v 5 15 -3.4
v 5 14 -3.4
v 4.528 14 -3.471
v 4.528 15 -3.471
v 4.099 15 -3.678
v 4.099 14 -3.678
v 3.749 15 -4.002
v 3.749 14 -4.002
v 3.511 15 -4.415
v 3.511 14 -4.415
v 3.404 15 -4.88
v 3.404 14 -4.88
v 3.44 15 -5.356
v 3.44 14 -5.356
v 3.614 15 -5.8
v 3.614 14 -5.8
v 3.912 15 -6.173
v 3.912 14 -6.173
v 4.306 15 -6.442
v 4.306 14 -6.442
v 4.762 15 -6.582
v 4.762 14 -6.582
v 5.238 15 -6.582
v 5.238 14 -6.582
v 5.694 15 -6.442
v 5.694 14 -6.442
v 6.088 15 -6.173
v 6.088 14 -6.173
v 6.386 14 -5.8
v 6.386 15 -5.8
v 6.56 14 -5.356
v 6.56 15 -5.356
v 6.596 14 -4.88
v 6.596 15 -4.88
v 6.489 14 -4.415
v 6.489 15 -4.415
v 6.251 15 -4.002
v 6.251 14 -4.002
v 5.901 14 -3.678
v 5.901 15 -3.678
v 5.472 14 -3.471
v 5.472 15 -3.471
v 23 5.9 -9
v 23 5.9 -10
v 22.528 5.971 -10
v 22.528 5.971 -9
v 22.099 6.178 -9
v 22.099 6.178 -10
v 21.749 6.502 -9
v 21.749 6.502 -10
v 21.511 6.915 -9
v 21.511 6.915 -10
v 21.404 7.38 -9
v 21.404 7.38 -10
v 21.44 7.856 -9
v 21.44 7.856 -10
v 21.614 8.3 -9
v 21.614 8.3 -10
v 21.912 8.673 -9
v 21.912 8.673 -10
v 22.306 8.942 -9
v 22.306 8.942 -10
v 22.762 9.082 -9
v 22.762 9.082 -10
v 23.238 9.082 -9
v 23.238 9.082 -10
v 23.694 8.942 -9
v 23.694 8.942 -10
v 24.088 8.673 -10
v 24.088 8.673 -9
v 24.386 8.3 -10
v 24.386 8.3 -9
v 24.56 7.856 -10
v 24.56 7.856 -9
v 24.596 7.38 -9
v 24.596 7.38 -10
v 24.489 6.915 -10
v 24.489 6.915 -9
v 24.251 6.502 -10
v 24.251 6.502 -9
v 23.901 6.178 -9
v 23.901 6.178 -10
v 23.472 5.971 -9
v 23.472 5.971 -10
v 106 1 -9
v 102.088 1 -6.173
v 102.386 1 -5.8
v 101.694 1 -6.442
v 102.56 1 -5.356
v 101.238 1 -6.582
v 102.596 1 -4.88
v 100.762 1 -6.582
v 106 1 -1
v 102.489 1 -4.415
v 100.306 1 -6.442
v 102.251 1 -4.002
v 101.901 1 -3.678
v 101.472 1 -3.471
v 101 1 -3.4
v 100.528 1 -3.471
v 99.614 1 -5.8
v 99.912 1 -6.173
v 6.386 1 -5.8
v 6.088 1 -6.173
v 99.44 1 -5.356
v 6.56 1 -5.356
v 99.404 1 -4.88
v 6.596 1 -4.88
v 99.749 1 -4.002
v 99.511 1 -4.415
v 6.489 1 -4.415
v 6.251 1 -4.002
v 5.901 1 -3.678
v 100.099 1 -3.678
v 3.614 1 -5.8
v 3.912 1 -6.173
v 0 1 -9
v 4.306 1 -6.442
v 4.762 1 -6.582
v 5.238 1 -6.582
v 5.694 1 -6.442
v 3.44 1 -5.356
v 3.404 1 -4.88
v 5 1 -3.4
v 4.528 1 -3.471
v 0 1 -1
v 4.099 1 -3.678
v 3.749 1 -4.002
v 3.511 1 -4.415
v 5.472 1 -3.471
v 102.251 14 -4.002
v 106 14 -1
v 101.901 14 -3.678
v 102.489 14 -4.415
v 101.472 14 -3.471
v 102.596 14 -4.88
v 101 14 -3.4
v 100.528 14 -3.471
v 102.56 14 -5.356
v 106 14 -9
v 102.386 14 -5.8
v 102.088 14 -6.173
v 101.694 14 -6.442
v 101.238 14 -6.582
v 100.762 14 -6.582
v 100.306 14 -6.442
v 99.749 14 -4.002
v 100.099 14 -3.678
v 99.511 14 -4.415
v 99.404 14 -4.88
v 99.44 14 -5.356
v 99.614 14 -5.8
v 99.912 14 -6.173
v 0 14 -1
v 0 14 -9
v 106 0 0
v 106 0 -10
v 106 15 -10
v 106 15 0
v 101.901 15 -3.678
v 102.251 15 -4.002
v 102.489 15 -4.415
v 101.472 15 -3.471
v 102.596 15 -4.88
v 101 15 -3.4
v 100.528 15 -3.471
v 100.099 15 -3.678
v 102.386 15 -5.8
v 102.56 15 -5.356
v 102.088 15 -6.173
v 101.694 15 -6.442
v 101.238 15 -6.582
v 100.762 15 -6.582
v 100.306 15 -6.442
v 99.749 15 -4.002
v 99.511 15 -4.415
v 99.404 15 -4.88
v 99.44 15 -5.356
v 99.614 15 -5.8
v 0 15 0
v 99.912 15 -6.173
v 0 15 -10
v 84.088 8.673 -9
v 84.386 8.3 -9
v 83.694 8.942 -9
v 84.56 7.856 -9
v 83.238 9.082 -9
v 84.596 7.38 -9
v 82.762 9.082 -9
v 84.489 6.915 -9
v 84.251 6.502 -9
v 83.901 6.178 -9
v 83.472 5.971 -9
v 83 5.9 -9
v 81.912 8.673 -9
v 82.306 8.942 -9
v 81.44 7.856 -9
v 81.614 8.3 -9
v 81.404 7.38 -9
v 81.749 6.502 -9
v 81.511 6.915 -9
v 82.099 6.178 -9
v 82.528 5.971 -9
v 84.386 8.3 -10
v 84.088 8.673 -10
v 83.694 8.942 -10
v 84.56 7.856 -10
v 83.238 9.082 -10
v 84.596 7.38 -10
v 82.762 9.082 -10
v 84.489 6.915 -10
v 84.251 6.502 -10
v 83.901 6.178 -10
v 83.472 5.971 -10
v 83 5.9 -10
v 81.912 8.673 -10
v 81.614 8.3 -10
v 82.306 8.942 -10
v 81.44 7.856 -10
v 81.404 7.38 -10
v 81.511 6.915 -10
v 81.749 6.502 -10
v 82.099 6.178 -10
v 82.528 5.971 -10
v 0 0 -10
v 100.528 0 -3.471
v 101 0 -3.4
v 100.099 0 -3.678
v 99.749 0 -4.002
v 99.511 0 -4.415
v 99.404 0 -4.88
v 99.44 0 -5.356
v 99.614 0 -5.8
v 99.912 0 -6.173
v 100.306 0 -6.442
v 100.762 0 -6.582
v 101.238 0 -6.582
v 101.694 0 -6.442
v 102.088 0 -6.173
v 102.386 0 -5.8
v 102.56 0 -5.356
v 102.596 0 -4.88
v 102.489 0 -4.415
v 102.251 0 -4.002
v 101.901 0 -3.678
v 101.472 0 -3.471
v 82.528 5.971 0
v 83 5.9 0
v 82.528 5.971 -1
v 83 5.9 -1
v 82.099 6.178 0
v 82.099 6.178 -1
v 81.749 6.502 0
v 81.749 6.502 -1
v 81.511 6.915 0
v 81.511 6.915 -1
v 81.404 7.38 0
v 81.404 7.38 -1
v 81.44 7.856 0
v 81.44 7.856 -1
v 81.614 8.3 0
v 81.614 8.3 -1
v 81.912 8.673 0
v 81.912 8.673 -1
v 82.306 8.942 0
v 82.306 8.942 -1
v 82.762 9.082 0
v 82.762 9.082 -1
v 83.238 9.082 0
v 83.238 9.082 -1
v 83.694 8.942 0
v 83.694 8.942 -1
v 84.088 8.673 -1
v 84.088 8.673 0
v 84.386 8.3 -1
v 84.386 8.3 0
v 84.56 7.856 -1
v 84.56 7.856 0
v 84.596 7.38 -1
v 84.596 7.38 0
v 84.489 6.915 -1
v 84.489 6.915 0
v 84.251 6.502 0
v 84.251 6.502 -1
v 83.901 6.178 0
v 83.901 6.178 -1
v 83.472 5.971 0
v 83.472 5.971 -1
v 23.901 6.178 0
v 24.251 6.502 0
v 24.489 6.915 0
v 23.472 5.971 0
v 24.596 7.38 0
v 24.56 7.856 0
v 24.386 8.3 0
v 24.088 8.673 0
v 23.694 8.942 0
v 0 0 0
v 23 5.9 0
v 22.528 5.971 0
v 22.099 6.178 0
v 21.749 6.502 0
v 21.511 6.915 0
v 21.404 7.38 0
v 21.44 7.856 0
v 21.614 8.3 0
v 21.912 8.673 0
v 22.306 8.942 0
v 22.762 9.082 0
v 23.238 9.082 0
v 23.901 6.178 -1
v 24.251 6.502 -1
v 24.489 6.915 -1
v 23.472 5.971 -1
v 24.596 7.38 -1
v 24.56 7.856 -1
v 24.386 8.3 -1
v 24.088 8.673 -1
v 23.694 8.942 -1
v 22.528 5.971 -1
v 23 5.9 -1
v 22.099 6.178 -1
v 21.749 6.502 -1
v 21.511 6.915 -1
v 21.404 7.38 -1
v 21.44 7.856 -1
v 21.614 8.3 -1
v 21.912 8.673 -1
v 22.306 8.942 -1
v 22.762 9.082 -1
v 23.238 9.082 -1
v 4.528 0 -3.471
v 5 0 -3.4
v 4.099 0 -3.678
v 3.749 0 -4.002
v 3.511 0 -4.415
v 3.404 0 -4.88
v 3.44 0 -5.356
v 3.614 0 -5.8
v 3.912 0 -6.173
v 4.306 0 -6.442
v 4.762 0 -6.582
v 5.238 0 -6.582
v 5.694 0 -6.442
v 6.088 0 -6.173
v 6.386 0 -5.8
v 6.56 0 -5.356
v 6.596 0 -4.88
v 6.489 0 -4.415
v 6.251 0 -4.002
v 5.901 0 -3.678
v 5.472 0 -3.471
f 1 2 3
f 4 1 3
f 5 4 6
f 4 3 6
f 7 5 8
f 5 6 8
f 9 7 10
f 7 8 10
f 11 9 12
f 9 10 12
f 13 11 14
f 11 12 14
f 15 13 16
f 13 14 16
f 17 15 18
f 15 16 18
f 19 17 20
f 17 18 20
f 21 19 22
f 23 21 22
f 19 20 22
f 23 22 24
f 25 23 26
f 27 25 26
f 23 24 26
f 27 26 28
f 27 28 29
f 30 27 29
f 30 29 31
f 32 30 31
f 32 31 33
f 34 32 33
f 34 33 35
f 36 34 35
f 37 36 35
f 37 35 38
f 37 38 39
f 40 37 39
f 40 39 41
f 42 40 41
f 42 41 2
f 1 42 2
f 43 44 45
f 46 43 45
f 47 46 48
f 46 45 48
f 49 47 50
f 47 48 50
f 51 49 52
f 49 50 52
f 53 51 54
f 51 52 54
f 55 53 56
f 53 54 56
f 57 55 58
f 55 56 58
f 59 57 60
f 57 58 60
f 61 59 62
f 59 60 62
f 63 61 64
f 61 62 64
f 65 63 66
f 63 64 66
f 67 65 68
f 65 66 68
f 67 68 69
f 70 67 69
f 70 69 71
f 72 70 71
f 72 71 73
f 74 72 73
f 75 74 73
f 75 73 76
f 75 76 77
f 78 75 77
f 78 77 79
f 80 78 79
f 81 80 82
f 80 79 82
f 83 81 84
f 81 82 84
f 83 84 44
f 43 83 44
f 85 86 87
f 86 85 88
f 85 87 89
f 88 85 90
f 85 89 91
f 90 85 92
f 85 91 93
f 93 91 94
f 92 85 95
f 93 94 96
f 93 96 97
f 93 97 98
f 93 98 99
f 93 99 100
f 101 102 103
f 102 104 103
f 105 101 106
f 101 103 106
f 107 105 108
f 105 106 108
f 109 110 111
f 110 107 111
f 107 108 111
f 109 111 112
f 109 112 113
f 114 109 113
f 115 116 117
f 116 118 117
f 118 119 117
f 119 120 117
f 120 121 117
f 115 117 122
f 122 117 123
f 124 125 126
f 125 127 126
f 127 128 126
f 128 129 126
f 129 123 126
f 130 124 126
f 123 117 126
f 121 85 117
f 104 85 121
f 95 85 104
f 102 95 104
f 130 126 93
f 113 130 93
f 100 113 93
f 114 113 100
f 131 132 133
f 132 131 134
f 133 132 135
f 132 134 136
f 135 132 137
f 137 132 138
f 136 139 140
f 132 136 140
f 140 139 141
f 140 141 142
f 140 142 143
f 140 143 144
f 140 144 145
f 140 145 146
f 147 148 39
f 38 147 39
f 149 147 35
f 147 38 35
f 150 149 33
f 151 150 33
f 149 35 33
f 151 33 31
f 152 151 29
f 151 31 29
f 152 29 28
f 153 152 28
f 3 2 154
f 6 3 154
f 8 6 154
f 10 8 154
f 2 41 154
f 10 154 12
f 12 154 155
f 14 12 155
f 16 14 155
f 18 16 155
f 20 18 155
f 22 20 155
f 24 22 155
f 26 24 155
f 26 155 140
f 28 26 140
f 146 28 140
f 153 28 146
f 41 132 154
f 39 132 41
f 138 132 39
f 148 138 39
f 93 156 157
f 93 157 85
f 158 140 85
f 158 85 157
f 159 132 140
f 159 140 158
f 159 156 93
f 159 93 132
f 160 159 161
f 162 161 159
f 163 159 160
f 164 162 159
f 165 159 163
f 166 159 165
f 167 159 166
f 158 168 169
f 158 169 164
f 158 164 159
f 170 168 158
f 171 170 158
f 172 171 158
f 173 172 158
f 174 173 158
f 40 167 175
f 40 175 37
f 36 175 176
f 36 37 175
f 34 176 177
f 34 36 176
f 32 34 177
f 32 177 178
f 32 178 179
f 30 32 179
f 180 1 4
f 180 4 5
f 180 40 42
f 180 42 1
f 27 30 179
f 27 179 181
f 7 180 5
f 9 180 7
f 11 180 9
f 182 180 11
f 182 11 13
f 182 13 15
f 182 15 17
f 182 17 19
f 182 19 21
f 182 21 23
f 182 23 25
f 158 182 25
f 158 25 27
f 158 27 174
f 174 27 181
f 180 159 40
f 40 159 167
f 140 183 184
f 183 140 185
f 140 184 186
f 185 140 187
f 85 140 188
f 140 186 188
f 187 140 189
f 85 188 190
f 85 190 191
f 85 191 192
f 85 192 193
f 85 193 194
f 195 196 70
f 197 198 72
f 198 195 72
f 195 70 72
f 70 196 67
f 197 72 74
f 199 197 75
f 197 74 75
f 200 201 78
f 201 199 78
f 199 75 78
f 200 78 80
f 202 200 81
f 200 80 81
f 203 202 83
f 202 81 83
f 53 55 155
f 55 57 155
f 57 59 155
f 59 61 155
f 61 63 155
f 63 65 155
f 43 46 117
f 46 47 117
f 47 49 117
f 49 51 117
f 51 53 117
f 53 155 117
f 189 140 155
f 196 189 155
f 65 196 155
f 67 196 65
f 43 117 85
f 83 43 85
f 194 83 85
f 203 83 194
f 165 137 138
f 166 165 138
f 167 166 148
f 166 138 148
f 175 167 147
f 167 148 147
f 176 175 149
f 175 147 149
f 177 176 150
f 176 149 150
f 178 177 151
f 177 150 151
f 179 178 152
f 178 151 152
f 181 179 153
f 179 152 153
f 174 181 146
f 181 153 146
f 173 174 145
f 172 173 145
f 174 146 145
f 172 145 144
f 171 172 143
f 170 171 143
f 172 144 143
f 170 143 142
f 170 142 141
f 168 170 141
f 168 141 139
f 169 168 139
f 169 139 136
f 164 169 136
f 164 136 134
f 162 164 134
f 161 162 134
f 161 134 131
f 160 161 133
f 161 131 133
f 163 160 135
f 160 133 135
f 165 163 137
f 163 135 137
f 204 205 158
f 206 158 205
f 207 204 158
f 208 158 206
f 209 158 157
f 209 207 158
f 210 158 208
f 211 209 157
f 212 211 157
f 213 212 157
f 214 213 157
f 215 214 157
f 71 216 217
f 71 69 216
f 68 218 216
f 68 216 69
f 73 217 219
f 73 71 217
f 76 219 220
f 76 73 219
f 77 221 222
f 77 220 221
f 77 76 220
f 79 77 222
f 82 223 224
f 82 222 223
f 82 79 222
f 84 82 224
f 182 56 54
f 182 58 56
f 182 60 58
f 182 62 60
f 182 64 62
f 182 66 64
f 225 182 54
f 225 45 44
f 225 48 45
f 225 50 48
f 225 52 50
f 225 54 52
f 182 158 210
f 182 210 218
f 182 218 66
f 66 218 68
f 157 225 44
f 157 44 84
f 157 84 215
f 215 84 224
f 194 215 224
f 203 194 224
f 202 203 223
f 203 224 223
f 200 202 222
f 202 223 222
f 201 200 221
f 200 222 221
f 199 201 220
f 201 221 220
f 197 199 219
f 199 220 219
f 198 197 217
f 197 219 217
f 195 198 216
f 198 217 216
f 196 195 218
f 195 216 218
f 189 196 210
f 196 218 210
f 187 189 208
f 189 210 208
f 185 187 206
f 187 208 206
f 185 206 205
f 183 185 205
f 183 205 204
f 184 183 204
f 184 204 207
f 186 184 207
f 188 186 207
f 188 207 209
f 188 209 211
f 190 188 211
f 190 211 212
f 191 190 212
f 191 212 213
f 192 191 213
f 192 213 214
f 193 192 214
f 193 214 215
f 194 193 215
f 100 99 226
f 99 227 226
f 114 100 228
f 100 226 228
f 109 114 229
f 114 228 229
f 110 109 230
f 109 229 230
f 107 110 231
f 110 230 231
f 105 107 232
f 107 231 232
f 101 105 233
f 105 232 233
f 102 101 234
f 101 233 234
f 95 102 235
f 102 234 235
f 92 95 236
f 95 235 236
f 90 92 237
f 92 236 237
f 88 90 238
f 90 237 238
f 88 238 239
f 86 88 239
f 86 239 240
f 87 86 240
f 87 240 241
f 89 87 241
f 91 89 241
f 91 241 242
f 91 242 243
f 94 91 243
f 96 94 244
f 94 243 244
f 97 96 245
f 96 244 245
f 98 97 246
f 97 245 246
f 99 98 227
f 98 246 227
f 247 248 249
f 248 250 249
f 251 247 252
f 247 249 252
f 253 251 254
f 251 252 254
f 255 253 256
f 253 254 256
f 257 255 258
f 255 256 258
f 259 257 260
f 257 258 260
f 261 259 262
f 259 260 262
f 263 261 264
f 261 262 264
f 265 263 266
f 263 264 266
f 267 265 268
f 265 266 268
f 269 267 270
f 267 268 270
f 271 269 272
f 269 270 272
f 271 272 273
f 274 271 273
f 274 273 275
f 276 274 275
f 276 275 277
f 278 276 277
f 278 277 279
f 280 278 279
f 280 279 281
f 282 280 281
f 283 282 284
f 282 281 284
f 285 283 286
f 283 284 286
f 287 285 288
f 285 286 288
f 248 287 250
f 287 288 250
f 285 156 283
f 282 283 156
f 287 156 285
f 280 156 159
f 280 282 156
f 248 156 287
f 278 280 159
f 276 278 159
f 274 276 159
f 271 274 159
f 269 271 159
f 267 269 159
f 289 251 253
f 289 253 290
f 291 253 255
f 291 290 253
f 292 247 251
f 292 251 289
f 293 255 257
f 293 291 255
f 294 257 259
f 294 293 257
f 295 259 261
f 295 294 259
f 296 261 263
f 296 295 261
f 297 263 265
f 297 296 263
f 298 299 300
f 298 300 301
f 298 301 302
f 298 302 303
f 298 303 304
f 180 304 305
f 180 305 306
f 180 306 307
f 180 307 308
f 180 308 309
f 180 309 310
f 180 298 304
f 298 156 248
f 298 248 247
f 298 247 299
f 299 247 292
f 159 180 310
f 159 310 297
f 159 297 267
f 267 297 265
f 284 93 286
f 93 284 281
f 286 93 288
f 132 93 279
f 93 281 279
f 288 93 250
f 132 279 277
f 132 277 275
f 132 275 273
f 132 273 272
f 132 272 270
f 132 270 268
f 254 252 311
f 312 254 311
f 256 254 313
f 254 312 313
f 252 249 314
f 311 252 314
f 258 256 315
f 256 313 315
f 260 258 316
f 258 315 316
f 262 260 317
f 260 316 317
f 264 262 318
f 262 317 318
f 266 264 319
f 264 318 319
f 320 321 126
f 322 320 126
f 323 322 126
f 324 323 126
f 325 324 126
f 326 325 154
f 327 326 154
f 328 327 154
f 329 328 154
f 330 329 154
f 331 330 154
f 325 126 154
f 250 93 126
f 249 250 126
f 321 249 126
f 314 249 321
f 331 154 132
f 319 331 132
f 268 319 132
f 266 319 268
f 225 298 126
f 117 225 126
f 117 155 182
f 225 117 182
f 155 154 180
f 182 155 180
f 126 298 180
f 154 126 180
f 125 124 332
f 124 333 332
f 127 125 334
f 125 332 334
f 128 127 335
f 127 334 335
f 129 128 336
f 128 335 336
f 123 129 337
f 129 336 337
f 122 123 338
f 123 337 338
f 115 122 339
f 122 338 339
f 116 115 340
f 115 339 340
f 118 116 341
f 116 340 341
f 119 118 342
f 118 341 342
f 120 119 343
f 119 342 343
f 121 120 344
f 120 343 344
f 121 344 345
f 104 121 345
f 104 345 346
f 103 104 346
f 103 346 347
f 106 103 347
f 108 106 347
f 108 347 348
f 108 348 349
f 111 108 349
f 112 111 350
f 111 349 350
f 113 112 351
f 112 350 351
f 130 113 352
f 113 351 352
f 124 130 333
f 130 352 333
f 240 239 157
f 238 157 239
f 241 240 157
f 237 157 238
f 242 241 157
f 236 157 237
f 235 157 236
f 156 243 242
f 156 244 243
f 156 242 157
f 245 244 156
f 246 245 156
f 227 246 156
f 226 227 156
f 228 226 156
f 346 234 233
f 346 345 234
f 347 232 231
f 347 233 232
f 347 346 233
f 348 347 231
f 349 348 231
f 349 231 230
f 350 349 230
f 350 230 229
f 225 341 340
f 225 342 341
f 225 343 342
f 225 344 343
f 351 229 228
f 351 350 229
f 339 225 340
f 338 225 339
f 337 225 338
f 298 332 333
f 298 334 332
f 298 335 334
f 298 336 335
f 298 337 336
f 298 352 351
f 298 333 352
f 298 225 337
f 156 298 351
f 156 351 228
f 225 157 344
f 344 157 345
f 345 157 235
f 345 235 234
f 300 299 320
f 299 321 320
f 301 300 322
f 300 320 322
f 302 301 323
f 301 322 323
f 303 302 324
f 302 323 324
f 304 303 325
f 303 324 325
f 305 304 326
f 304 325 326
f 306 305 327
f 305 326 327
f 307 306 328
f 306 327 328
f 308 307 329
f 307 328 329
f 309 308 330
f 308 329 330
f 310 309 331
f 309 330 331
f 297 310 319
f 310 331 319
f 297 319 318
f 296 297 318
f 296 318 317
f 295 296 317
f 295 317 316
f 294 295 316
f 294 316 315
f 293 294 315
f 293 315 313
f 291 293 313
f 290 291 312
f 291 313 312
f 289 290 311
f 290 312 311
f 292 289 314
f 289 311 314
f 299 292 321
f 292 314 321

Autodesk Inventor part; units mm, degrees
ref_plane "YZ Plane" through (0, 0, 0) normal (1, 0, 0) x (0, 1, 0)
ref_plane "XZ Plane" through (0, 0, 0) normal (0, 1, 0) x (-1, 0, 0)
ref_plane "XY Plane" through (0, 0, 0) normal (0, 0, 1) x (1, 0, 0)
sketch "スケッチ1" plane through (0, 0, 0) normal (1, 0, 0) x (0, 1, 0)
  line L0 (0, 0) -> (15, 0)
  line L1 (15, 0) -> (15, -10)
  line L2 (15, -10) -> (0, -10)
  line L3 (0, -10) -> (0, 0)
  line L4 (1, -1) -> (14, -1)
  line L5 (14, -1) -> (14, -9)
  line L6 (14, -9) -> (1, -9)
  line L7 (1, -9) -> (1, -1)
  dimension "d0" = 15
  dimension "d1" = 10
  dimension "d2" = 13
  dimension "d3" = 8
  dimension "d4" = 1
  dimension "d5" = 1
extrude "押し出し1" add sketch "スケッチ1" along normal blind 106
sketch "スケッチ2" plane through (0, 15, 0) normal (0, 1, 0) x (1, 0, 0)
  line L0 (0, 9) -> (0, 1) projected
  line L1 (0, 5) -> (120, 5)
  line L2 (106, 10) -> (106, 0) projected
  point P0 (0, 0)
  point P1 (5, 5)
  point P2 (101, 5)
  point P3 (106, 0)
  dimension "d8" = 5
  dimension "d9" = 5
hole "穴1" at (5, 15, -5) at (101, 15, -5) direction (0, -1, 0) diameter 3.2 end through all
sketch "スケッチ3" plane through (0, 0, 0) normal (0, 0, 1) x (1, 0, 0)
  line L0 (0, 0) -> (0, 15) projected
  line L1 (0, 7.5) -> (106, 7.5)
  line L2 (106, 0) -> (106, 15) projected
  point P0 (23, 7.5)
  point P1 (83, 7.5)
  point P2 (53, 7.5)
  dimension "d17" = 30
  dimension "d18" = 30
hole "穴2" at (23, 7.5, 0) at (83, 7.5, 0) direction (0, 0, -1) diameter 3.2 end through all
properties part number "link2_pipe1" material "アルミニウム 6061"
